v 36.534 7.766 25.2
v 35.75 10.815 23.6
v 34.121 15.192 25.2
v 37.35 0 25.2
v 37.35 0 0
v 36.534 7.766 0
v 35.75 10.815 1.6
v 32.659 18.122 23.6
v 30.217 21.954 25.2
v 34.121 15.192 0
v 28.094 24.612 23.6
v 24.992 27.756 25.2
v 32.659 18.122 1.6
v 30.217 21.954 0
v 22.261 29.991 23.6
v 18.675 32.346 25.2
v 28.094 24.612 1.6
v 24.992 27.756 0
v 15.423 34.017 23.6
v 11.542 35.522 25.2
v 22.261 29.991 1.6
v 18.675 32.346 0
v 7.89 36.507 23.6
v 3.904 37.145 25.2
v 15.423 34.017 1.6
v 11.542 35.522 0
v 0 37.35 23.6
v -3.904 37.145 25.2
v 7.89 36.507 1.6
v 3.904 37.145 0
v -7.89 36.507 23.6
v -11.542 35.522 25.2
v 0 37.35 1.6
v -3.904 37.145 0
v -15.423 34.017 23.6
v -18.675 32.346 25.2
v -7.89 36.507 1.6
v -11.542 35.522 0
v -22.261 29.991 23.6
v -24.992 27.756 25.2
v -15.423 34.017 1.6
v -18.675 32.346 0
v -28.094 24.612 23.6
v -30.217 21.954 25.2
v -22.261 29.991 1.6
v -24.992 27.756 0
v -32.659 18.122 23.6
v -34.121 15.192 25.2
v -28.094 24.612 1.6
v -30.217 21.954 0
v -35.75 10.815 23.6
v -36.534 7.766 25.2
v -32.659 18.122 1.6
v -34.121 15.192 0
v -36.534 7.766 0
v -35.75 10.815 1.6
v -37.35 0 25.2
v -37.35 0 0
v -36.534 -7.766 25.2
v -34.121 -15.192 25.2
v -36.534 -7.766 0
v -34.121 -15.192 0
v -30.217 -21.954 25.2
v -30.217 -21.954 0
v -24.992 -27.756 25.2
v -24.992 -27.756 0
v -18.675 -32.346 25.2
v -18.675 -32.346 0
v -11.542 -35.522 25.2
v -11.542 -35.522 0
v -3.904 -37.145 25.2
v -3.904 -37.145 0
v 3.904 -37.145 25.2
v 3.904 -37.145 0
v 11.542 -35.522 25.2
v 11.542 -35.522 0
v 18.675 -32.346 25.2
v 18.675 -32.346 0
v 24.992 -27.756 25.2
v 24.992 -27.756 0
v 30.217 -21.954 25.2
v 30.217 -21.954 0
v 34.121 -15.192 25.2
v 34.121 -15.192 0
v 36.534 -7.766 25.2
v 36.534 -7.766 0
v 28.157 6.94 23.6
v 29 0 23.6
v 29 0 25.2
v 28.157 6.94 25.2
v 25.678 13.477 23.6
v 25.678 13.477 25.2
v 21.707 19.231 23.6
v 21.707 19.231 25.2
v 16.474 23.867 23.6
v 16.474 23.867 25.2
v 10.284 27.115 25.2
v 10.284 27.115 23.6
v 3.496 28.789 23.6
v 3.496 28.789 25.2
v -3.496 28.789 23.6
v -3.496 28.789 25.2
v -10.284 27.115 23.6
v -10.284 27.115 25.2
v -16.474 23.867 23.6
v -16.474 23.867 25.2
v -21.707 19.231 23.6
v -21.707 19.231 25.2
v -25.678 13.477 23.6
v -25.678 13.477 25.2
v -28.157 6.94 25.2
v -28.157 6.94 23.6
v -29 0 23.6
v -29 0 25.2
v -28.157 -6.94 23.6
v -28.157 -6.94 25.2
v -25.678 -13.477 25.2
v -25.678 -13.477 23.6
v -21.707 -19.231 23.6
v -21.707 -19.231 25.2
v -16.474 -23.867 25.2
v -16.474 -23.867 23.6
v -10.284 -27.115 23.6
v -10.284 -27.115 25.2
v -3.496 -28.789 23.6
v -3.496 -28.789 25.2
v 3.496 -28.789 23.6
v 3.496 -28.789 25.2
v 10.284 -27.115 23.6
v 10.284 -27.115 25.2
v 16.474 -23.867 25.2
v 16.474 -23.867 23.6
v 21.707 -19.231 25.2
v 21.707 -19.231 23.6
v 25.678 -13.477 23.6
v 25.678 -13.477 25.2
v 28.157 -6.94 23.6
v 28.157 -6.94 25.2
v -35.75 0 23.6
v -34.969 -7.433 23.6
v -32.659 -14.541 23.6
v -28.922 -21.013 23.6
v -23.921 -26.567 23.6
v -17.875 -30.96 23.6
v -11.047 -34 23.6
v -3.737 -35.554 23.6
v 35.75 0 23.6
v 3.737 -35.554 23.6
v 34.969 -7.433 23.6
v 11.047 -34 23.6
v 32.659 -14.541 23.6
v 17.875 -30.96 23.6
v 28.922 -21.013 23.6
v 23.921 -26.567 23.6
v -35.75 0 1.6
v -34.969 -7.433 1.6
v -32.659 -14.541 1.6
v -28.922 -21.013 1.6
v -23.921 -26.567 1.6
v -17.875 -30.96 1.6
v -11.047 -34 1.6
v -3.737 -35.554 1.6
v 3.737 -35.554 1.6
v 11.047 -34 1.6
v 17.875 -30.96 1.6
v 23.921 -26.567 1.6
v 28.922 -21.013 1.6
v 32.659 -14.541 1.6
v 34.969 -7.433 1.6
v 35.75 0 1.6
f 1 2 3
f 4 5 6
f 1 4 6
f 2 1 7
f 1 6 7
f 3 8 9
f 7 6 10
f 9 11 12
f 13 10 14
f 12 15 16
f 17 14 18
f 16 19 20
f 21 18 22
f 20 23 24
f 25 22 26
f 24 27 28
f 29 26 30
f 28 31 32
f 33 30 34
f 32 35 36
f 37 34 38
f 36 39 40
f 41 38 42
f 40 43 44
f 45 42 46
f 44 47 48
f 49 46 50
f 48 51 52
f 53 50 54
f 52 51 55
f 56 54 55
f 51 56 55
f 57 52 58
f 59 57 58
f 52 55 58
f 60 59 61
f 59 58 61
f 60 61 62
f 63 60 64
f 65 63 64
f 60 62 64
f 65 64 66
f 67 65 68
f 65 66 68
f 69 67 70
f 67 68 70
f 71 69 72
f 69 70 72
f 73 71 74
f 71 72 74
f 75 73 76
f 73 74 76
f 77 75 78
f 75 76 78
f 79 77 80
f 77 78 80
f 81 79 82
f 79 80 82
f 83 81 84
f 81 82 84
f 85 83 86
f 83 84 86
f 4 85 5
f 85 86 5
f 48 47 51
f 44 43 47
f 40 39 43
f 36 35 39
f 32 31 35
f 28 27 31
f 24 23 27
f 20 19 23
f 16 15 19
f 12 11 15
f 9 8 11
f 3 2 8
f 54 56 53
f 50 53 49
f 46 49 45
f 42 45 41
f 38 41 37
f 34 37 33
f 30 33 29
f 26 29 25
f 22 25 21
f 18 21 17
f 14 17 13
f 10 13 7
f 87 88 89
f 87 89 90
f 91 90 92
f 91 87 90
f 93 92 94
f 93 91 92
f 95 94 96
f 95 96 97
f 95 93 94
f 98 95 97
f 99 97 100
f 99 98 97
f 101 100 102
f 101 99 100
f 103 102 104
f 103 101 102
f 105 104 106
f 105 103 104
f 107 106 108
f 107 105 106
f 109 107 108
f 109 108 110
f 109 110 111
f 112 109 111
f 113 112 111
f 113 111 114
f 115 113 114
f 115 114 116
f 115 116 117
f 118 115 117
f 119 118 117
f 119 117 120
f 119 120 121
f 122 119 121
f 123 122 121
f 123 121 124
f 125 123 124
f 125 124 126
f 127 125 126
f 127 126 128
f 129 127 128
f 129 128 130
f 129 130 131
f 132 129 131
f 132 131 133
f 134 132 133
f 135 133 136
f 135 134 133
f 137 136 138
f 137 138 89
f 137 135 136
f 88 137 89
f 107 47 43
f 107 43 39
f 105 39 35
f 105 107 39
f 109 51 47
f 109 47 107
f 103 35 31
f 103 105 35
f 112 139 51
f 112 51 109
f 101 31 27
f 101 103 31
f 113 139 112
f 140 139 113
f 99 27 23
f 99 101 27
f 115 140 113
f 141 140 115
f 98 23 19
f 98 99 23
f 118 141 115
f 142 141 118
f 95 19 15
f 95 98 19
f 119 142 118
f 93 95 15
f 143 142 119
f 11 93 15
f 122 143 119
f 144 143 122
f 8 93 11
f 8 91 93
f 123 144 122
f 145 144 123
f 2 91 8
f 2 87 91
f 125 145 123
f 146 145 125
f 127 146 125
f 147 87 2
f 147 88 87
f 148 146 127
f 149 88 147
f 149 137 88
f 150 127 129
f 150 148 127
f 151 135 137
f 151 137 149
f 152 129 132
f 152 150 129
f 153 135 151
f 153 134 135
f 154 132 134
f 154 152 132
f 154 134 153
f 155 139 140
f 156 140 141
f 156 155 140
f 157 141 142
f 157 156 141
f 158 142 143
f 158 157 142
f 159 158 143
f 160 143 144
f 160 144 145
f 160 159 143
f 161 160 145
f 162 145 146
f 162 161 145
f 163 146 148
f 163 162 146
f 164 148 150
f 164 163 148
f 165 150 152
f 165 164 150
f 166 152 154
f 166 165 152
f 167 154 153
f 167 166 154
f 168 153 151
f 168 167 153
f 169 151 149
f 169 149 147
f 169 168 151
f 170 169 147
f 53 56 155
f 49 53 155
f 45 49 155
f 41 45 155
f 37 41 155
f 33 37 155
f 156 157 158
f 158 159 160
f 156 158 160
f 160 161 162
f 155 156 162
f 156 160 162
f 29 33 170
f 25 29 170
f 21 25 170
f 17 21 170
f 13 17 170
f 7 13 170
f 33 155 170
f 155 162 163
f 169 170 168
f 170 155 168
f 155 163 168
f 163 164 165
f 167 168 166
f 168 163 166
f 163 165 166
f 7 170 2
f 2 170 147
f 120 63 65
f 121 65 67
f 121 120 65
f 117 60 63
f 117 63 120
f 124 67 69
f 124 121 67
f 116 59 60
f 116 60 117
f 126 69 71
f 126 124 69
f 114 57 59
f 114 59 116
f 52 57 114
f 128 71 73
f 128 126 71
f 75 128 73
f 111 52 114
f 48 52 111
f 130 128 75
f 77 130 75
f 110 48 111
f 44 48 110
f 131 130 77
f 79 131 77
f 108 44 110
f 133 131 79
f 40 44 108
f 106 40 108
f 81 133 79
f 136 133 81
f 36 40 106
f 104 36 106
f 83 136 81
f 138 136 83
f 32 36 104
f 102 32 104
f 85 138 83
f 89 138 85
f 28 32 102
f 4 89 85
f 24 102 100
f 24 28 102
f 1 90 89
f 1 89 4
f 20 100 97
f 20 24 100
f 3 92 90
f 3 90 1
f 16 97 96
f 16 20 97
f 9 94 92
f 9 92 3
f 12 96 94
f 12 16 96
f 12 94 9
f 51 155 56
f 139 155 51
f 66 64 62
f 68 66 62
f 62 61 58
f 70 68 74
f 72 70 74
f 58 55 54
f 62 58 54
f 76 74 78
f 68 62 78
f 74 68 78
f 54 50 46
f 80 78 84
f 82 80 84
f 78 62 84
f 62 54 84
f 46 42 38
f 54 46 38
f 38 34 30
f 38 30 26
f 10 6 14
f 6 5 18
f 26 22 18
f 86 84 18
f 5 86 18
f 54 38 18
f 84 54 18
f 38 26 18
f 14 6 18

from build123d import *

# Parameters (mm, degrees)
SKETCH_R      = 37.35
PAD_DEPTH     = 23.6
THICKNESS_T   = -1.6
SKETCH001_R   = 37.35
SKETCH001_R_2 = 29
PAD001_DEPTH  = 1.6
SKETCH002_W   = 71.5
SKETCH002_H   = 22
POCKET_DEPTH  = 50


with BuildPart() as part:
    # Sketch → Pad (new body)
    with BuildSketch(Plane.XY):
        Circle(SKETCH_R)
    extrude(amount=PAD_DEPTH)

    # Thickness
    thickness_openings = [part.faces().sort_by_distance(p)[0] for p in [
        (0, 0, 23.6),
    ]]
    offset(amount=THICKNESS_T, openings=thickness_openings)

    # Sketch001 (on Face3 of Thickness) → Pad001 (join)
    with BuildSketch(Plane.XY.offset(23.6)):
        Circle(SKETCH001_R)
        Circle(SKETCH001_R_2, mode=Mode.SUBTRACT)
    extrude(amount=PAD001_DEPTH)

    # Sketch002 → Pocket (cut)
    with BuildSketch(Plane.XZ):
        with Locations((0, 12.6)):
            Rectangle(SKETCH002_W, SKETCH002_H)
    extrude(amount=-POCKET_DEPTH, mode=Mode.SUBTRACT)


solid = part.part
